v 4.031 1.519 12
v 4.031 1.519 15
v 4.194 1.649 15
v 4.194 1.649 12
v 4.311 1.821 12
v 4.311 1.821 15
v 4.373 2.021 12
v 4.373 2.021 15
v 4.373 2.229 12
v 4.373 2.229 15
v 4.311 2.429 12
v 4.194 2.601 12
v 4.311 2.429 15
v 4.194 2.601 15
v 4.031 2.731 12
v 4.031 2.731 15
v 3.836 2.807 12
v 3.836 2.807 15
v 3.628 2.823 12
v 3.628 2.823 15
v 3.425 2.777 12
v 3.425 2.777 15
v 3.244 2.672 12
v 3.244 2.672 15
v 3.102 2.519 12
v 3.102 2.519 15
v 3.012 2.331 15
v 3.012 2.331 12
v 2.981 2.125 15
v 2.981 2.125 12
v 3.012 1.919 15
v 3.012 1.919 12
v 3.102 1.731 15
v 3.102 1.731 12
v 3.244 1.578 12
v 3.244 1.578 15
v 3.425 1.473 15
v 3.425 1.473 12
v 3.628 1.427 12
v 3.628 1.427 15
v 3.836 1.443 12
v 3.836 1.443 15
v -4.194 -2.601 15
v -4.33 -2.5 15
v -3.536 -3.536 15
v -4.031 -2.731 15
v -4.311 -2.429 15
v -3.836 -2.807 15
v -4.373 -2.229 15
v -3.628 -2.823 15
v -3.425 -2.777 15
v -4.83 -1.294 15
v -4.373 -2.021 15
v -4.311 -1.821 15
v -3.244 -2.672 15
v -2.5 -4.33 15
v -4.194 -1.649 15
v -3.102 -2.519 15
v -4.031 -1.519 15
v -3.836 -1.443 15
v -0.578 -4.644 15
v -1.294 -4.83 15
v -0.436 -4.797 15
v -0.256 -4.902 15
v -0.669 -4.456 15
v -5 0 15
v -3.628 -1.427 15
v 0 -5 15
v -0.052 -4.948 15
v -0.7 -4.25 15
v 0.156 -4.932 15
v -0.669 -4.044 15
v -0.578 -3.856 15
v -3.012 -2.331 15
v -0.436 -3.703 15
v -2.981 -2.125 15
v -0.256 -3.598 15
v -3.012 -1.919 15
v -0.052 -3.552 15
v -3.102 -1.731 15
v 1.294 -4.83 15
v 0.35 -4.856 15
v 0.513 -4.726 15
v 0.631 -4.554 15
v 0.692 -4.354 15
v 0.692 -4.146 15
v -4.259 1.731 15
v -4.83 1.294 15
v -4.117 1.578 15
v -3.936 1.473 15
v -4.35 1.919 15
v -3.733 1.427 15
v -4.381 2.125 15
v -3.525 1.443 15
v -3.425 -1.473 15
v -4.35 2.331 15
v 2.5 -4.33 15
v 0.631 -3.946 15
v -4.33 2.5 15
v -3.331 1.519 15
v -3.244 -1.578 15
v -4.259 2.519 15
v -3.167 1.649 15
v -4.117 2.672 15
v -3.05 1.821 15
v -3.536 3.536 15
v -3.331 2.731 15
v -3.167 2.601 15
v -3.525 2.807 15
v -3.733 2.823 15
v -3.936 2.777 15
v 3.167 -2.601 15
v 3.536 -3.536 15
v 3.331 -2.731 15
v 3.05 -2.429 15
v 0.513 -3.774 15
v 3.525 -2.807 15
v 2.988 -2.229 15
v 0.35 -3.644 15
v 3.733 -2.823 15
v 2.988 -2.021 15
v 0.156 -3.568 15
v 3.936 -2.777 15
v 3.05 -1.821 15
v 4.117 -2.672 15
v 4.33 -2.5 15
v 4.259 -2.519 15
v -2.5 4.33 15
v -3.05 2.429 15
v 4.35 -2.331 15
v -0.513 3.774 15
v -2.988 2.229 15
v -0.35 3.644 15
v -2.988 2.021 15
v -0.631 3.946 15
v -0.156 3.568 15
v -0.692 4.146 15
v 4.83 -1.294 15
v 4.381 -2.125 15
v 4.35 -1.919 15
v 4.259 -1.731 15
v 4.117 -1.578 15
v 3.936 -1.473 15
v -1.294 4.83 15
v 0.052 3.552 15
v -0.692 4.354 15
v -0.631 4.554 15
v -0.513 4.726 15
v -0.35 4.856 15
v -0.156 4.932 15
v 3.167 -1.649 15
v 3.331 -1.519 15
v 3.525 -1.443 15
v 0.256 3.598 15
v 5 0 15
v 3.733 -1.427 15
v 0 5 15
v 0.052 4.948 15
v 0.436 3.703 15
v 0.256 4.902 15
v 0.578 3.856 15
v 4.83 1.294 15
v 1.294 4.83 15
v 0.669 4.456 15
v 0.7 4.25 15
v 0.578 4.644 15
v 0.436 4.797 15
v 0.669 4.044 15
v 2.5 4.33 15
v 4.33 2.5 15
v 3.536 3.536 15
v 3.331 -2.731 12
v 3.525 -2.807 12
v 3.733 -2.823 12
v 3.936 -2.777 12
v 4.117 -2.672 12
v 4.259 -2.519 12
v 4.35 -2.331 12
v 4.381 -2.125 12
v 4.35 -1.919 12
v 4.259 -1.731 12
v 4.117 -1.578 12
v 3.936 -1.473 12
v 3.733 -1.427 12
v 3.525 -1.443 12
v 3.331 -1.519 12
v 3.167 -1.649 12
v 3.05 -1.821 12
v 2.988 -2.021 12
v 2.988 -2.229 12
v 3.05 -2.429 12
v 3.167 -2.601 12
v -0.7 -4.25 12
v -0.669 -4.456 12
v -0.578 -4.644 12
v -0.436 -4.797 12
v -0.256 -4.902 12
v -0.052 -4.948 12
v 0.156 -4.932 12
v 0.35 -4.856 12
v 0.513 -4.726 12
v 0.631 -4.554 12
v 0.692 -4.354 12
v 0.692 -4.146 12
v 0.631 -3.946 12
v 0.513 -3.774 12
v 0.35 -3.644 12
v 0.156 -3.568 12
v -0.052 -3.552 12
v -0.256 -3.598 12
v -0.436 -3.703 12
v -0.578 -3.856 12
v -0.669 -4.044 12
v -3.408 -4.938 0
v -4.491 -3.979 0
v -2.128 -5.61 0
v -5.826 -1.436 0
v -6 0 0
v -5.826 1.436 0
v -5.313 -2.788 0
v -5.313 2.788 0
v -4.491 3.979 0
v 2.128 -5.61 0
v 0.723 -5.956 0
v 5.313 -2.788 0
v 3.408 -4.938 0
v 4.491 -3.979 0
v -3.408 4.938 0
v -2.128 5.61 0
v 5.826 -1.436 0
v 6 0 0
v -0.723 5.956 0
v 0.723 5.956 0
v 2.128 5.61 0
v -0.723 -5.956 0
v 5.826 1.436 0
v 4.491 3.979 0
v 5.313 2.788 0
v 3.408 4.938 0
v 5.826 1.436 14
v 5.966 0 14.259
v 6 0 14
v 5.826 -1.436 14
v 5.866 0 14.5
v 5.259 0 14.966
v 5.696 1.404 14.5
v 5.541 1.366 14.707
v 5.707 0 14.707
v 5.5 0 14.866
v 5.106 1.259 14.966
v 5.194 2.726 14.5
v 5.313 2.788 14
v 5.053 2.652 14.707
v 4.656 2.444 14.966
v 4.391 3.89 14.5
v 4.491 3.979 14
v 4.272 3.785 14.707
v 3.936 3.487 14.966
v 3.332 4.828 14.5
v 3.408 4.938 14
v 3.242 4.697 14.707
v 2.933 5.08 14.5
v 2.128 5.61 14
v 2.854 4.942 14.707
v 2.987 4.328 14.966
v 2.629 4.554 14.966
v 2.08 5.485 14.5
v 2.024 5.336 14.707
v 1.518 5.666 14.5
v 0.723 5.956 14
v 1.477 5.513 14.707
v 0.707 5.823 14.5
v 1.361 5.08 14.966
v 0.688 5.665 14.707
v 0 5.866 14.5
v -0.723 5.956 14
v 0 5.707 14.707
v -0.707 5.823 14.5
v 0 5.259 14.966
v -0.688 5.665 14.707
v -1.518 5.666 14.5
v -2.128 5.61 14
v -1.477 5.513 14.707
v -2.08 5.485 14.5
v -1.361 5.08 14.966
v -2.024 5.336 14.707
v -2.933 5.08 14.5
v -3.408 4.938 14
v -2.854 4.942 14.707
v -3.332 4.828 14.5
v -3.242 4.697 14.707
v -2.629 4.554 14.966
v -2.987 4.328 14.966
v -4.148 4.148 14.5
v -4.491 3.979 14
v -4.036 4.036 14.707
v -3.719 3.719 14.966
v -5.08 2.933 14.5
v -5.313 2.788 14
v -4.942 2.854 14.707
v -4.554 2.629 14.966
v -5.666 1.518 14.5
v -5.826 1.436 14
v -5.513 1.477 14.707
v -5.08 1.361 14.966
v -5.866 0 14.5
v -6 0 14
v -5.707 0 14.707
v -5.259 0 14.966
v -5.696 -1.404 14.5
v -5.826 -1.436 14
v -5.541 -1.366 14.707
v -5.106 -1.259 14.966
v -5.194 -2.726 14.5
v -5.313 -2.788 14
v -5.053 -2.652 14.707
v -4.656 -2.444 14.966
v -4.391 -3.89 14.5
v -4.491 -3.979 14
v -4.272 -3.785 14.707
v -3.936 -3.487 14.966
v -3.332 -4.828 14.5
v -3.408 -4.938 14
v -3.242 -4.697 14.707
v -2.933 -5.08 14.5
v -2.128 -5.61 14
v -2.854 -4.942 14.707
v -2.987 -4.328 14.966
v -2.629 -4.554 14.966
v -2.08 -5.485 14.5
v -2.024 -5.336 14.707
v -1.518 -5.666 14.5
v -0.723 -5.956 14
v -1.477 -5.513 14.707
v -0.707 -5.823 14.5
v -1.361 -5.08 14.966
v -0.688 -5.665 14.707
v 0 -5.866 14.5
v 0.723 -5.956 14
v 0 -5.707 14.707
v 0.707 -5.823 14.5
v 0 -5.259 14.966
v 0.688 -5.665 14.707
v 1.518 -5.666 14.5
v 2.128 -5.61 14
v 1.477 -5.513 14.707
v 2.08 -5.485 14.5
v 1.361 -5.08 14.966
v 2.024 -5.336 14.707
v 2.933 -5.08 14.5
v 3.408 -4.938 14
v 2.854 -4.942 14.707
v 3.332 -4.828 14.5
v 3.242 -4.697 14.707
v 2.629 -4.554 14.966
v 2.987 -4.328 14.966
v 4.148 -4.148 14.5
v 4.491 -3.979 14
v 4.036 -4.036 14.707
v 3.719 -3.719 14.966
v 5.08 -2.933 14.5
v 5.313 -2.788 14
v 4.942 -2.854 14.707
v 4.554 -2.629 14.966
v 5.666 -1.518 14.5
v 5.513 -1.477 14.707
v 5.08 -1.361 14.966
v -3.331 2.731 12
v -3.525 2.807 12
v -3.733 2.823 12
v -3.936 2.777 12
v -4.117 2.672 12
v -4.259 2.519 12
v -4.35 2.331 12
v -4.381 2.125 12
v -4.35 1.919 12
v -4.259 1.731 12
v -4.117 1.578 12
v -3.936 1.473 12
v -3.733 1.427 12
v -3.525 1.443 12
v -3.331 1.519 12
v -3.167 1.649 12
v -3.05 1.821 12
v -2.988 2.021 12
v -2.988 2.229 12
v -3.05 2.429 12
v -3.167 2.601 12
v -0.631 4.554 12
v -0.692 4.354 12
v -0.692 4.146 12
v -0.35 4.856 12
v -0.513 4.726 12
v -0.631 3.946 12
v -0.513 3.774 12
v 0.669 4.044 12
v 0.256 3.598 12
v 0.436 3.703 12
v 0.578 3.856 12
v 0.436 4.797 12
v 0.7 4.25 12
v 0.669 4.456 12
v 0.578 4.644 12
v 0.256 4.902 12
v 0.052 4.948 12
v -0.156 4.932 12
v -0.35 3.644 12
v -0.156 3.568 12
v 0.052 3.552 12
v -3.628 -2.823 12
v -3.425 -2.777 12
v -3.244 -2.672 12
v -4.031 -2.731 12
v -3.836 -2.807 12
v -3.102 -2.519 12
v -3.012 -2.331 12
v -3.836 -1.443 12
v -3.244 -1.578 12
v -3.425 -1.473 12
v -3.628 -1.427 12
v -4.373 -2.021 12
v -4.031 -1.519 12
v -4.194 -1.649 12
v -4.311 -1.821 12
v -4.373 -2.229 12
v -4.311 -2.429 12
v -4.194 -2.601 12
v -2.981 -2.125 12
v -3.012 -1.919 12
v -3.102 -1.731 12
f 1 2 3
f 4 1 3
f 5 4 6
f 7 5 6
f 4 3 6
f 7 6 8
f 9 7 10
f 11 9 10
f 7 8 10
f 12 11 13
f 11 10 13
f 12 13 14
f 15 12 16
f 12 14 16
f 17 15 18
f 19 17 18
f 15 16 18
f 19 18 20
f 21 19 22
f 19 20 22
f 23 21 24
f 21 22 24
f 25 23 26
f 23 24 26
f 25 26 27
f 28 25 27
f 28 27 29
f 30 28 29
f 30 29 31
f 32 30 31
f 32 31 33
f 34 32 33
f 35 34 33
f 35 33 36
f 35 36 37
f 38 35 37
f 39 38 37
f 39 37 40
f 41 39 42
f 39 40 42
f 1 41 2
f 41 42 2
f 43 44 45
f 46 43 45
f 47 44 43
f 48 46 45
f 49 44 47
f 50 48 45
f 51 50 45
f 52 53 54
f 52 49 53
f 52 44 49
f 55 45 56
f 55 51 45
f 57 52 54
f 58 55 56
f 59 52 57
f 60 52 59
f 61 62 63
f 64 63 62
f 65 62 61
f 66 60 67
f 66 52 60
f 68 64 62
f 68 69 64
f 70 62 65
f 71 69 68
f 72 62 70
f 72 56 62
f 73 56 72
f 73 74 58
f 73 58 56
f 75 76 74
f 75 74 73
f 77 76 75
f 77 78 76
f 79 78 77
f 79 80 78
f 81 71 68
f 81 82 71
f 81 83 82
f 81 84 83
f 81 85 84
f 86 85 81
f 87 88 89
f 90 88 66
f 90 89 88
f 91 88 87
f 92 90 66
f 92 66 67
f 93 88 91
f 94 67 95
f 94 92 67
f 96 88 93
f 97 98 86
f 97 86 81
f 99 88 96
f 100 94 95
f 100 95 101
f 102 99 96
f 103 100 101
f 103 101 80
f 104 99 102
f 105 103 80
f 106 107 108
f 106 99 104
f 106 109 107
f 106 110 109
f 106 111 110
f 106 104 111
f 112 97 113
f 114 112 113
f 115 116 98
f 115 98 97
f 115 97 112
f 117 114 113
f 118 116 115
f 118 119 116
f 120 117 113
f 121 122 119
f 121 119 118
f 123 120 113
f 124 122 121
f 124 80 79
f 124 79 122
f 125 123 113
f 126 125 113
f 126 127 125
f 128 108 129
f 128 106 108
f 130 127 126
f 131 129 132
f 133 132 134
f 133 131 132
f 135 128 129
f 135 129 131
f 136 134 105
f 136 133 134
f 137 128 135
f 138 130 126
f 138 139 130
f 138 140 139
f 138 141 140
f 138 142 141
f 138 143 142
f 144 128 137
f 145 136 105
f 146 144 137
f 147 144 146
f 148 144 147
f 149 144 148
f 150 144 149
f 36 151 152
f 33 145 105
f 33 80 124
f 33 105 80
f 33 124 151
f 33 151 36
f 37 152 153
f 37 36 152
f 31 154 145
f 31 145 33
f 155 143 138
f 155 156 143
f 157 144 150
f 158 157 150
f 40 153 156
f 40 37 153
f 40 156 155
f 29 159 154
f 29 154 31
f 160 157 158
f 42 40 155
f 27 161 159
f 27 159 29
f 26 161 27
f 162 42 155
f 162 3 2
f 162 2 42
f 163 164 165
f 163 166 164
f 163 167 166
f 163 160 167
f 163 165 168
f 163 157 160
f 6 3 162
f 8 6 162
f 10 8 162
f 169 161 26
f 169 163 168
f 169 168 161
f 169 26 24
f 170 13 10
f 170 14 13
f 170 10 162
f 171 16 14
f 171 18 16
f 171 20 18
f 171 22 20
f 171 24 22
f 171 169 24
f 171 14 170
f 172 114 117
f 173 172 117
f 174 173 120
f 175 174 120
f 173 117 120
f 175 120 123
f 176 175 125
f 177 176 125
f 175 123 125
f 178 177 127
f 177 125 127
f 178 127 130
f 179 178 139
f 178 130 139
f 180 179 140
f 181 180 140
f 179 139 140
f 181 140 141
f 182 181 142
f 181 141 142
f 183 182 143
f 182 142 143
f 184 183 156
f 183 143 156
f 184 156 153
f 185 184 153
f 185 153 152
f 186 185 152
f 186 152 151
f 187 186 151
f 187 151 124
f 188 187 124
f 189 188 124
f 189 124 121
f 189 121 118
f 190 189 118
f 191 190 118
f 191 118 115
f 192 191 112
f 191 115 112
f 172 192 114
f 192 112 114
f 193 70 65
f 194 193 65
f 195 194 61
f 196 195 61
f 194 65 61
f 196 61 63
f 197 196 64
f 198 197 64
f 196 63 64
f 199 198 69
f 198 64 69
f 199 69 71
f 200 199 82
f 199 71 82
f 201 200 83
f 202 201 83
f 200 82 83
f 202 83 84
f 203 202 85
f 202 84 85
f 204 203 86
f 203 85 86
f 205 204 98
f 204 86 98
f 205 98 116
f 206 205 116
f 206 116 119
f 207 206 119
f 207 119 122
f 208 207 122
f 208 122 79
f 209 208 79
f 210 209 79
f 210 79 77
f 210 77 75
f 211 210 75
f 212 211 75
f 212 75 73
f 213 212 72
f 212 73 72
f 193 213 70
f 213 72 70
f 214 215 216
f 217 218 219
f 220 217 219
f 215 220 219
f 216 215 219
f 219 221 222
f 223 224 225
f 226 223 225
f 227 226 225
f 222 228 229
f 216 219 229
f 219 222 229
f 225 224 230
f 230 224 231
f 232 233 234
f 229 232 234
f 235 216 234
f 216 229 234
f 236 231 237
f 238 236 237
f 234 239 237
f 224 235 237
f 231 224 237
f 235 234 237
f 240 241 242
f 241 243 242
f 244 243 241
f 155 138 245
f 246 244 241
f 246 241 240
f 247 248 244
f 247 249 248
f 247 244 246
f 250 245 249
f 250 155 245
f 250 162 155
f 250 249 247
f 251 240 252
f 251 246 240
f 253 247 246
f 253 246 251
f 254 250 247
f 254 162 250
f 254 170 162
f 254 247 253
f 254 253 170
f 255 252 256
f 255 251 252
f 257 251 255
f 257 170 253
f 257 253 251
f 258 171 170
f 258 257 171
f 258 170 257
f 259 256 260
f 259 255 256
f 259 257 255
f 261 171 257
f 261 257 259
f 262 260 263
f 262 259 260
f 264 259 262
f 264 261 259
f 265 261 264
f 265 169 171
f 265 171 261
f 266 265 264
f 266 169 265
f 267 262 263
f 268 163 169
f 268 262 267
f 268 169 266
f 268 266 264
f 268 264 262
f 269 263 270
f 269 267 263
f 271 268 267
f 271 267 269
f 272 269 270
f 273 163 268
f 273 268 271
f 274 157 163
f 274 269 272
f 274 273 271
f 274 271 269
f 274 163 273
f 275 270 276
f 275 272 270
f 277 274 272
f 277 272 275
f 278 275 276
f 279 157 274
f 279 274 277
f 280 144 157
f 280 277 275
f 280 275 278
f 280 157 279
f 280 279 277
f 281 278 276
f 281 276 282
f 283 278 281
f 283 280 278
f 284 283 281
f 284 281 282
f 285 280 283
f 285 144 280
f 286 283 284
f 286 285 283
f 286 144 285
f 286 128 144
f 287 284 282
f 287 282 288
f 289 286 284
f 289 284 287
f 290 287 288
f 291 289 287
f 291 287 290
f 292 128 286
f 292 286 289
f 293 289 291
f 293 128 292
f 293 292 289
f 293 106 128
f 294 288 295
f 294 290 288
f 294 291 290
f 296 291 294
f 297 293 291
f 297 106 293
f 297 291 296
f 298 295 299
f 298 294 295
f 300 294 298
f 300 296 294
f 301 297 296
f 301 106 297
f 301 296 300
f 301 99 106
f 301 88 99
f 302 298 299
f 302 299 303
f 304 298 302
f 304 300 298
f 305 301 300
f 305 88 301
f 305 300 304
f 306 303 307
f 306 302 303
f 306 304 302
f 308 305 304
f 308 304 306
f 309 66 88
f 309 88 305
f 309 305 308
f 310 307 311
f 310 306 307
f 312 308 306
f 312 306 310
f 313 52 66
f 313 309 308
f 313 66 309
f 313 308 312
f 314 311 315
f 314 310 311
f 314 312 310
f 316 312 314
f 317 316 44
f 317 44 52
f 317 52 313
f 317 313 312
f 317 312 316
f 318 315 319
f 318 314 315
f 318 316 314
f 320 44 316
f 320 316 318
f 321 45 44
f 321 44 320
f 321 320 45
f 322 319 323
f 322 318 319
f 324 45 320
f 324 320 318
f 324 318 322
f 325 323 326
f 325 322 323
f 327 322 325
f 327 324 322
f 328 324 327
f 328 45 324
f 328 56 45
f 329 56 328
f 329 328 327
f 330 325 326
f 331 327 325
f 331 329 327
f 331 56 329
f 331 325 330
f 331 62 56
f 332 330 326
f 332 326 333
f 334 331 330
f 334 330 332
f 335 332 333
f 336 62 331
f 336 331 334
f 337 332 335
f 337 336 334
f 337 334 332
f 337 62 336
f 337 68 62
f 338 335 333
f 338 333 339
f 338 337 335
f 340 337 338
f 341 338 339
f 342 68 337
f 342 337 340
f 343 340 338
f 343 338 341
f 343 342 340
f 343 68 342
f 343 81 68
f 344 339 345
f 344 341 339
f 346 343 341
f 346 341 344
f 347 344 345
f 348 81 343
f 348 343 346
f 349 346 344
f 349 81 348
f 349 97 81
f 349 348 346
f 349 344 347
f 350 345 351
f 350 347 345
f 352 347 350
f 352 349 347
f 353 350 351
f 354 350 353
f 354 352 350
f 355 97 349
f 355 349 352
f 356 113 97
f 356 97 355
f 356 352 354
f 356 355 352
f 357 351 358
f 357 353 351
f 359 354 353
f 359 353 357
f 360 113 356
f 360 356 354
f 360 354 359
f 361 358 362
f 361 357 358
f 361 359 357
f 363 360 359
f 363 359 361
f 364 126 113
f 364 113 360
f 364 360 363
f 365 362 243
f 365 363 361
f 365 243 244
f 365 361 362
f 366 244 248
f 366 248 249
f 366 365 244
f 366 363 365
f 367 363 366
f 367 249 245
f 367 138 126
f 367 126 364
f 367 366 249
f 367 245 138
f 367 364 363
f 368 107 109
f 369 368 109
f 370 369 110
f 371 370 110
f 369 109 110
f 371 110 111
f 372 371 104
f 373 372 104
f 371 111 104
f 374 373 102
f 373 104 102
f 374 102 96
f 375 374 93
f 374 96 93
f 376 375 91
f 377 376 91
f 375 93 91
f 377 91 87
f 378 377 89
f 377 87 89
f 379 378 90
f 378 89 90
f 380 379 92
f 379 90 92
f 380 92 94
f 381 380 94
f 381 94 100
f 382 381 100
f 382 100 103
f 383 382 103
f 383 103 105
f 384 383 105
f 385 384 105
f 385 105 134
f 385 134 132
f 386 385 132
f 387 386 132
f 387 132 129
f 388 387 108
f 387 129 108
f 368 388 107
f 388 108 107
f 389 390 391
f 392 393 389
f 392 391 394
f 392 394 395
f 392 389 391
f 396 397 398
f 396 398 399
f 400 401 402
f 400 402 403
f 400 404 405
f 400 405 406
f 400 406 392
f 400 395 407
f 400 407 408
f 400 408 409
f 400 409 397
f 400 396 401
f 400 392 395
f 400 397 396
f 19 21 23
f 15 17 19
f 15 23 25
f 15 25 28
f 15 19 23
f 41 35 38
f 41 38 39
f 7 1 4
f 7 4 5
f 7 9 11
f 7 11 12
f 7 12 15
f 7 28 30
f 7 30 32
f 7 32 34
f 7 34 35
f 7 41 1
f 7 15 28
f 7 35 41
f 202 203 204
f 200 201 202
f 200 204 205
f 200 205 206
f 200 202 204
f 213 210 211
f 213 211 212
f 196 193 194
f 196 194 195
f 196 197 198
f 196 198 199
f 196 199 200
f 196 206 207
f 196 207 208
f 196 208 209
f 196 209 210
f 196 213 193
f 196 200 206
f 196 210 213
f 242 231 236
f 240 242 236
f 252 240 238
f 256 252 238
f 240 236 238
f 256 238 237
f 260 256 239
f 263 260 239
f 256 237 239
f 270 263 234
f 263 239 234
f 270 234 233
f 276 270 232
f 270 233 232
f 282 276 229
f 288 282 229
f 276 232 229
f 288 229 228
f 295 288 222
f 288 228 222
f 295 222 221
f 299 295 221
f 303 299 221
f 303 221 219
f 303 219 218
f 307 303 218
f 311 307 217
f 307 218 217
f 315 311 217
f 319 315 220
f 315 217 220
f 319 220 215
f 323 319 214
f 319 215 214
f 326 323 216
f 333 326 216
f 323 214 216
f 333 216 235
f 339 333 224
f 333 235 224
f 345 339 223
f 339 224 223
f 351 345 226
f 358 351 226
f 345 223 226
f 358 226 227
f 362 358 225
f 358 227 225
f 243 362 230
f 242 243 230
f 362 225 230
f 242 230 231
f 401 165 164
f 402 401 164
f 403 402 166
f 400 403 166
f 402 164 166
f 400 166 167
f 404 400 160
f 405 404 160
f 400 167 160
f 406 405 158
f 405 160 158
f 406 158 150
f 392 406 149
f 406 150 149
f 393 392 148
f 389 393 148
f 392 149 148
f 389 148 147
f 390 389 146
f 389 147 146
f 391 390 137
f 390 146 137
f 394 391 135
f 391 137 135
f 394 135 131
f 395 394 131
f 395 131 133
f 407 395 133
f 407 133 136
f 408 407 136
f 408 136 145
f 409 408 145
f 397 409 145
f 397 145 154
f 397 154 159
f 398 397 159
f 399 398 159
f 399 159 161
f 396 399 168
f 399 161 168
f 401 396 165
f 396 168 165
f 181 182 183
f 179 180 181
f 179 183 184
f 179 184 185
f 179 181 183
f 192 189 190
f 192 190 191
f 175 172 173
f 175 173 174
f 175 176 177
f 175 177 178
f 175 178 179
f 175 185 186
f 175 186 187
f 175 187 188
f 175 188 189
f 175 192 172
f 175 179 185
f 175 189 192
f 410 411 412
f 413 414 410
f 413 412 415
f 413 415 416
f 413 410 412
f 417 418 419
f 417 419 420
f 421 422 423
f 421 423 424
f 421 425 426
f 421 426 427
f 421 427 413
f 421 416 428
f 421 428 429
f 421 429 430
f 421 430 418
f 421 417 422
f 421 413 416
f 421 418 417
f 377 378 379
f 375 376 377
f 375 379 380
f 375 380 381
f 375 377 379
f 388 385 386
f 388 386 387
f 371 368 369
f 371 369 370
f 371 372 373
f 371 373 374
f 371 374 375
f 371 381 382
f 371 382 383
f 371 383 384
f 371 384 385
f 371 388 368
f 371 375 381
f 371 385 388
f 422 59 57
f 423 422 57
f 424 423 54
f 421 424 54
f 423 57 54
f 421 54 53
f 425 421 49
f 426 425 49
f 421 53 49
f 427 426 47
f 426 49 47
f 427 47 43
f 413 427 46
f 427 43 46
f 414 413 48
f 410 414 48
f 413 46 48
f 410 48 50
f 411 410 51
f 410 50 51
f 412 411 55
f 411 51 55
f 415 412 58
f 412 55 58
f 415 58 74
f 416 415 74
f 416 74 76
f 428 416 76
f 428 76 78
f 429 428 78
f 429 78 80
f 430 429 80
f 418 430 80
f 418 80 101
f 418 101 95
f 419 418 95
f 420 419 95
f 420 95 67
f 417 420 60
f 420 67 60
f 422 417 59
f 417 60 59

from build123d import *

# Parameters (mm, degrees)
SKETCH1_R           = 6
BOSS_EXTRUDE1_DEPTH = 15
SKETCH2_R           = 0.7
CUT_EXTRUDE1_DEPTH  = 3
CIRPATTERN1_COUNT   = 6
FILLET1_R           = 1


with BuildPart() as part:
    # Sketch1 → Boss-Extrude1 (new body)
    with BuildSketch(Plane.XY):
        Circle(SKETCH1_R)
    extrude(amount=BOSS_EXTRUDE1_DEPTH)

    # Sketch2 → Cut-Extrude1 (cut)
    with BuildSketch(Plane.XY.offset(15)):
        with Locations((0, 4.25)):
            Circle(SKETCH2_R)
    cut_extrude1 = extrude(amount=-CUT_EXTRUDE1_DEPTH, mode=Mode.SUBTRACT)

    # CirPattern1: Cut-Extrude1 ×6 about axis
    cirpattern1_axis = Axis((0, 0, 0), (0, 0, 1))
    for i in range(1, CIRPATTERN1_COUNT):
        add(cut_extrude1.rotate(cirpattern1_axis, i * 360 / CIRPATTERN1_COUNT), mode=Mode.SUBTRACT)

    # Fillet1
    fillet1_edges = [part.edges().sort_by_distance(p)[0] for p in [
        (-6, 0, 15),
    ]]
    fillet(fillet1_edges, radius=FILLET1_R)


solid = part.part
